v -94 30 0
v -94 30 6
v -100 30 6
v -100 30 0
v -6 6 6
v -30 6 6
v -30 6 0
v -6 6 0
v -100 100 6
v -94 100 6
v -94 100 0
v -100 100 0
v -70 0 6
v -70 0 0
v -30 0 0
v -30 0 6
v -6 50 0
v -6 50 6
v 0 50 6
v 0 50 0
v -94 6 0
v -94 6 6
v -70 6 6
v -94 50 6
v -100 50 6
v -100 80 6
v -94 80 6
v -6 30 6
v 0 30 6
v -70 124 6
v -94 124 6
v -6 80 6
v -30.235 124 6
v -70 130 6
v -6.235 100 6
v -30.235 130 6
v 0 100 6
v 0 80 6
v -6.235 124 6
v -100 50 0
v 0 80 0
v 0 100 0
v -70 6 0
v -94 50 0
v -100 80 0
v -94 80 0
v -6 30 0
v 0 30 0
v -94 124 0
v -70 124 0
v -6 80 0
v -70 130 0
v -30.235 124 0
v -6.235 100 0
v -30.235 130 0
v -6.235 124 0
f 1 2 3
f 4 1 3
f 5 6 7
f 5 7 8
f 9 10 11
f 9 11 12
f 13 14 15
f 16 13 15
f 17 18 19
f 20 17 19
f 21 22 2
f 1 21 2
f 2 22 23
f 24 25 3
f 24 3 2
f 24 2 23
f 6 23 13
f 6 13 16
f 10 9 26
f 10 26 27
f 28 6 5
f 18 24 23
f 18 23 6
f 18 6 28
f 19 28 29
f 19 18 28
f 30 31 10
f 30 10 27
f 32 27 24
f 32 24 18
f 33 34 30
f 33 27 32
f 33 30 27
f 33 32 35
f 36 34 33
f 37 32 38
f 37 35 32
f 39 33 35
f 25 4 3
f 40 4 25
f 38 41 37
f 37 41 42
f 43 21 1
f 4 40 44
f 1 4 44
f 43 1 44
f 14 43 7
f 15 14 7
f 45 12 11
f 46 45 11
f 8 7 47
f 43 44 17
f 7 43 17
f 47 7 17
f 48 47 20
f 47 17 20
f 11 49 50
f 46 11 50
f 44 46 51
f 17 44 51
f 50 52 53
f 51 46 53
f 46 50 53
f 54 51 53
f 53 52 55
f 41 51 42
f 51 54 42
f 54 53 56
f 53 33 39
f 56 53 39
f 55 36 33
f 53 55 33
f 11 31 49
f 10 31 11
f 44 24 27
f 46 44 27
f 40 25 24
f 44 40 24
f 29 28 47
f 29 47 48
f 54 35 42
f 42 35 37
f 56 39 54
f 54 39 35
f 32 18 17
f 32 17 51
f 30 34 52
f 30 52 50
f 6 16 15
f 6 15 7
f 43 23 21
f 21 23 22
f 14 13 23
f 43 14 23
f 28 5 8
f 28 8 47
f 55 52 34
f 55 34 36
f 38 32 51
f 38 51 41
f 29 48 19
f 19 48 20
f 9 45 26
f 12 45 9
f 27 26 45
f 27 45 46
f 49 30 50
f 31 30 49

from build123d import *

# Parameters (mm, degrees)
ESQUISSE1_W             = 100
ESQUISSE1_H             = 130
BOSS_EXTRU_1_DEPTH      = 6
ESQUISSE2_W             = 6
ESQUISSE2_H             = 30
ENL_V_MAT_EXTRU_1_DEPTH = 6


with BuildPart() as part:
    # Esquisse1 → Boss.-Extru.1 (new body)
    with BuildSketch(Plane.XY):
        with Locations((-50, 65)):
            Rectangle(ESQUISSE1_W, ESQUISSE1_H)
    extrude(amount=BOSS_EXTRU_1_DEPTH)

    # Esquisse2 → Enlèv. mat.-Extru.1 (cut)
    with BuildSketch(Plane.XY.offset(6)):
        Polygon((-100, 130), (-70, 130), (-70, 124), (-94, 124), (-94, 100), (-100, 100), align=None)
        Polygon((0, 130), (-30.235491659, 130), (-30.235491659, 124), (-6.235491659, 124), (-6.235491659, 100), (0, 100), align=None)
        Polygon((-100, 0), (-70, 0), (-70, 6), (-94, 6), (-94, 30), (-100, 30), align=None)
        Polygon((0, 0), (-30, 0), (-30, 6), (-6, 6), (-6, 30), (0, 30), align=None)
        with Locations((-97, 65)):
            Rectangle(ESQUISSE2_W, ESQUISSE2_H)
        with Locations((-3, 65)):
            Rectangle(ESQUISSE2_W, ESQUISSE2_H)
    extrude(amount=-ENL_V_MAT_EXTRU_1_DEPTH, mode=Mode.SUBTRACT)


solid = part.part
